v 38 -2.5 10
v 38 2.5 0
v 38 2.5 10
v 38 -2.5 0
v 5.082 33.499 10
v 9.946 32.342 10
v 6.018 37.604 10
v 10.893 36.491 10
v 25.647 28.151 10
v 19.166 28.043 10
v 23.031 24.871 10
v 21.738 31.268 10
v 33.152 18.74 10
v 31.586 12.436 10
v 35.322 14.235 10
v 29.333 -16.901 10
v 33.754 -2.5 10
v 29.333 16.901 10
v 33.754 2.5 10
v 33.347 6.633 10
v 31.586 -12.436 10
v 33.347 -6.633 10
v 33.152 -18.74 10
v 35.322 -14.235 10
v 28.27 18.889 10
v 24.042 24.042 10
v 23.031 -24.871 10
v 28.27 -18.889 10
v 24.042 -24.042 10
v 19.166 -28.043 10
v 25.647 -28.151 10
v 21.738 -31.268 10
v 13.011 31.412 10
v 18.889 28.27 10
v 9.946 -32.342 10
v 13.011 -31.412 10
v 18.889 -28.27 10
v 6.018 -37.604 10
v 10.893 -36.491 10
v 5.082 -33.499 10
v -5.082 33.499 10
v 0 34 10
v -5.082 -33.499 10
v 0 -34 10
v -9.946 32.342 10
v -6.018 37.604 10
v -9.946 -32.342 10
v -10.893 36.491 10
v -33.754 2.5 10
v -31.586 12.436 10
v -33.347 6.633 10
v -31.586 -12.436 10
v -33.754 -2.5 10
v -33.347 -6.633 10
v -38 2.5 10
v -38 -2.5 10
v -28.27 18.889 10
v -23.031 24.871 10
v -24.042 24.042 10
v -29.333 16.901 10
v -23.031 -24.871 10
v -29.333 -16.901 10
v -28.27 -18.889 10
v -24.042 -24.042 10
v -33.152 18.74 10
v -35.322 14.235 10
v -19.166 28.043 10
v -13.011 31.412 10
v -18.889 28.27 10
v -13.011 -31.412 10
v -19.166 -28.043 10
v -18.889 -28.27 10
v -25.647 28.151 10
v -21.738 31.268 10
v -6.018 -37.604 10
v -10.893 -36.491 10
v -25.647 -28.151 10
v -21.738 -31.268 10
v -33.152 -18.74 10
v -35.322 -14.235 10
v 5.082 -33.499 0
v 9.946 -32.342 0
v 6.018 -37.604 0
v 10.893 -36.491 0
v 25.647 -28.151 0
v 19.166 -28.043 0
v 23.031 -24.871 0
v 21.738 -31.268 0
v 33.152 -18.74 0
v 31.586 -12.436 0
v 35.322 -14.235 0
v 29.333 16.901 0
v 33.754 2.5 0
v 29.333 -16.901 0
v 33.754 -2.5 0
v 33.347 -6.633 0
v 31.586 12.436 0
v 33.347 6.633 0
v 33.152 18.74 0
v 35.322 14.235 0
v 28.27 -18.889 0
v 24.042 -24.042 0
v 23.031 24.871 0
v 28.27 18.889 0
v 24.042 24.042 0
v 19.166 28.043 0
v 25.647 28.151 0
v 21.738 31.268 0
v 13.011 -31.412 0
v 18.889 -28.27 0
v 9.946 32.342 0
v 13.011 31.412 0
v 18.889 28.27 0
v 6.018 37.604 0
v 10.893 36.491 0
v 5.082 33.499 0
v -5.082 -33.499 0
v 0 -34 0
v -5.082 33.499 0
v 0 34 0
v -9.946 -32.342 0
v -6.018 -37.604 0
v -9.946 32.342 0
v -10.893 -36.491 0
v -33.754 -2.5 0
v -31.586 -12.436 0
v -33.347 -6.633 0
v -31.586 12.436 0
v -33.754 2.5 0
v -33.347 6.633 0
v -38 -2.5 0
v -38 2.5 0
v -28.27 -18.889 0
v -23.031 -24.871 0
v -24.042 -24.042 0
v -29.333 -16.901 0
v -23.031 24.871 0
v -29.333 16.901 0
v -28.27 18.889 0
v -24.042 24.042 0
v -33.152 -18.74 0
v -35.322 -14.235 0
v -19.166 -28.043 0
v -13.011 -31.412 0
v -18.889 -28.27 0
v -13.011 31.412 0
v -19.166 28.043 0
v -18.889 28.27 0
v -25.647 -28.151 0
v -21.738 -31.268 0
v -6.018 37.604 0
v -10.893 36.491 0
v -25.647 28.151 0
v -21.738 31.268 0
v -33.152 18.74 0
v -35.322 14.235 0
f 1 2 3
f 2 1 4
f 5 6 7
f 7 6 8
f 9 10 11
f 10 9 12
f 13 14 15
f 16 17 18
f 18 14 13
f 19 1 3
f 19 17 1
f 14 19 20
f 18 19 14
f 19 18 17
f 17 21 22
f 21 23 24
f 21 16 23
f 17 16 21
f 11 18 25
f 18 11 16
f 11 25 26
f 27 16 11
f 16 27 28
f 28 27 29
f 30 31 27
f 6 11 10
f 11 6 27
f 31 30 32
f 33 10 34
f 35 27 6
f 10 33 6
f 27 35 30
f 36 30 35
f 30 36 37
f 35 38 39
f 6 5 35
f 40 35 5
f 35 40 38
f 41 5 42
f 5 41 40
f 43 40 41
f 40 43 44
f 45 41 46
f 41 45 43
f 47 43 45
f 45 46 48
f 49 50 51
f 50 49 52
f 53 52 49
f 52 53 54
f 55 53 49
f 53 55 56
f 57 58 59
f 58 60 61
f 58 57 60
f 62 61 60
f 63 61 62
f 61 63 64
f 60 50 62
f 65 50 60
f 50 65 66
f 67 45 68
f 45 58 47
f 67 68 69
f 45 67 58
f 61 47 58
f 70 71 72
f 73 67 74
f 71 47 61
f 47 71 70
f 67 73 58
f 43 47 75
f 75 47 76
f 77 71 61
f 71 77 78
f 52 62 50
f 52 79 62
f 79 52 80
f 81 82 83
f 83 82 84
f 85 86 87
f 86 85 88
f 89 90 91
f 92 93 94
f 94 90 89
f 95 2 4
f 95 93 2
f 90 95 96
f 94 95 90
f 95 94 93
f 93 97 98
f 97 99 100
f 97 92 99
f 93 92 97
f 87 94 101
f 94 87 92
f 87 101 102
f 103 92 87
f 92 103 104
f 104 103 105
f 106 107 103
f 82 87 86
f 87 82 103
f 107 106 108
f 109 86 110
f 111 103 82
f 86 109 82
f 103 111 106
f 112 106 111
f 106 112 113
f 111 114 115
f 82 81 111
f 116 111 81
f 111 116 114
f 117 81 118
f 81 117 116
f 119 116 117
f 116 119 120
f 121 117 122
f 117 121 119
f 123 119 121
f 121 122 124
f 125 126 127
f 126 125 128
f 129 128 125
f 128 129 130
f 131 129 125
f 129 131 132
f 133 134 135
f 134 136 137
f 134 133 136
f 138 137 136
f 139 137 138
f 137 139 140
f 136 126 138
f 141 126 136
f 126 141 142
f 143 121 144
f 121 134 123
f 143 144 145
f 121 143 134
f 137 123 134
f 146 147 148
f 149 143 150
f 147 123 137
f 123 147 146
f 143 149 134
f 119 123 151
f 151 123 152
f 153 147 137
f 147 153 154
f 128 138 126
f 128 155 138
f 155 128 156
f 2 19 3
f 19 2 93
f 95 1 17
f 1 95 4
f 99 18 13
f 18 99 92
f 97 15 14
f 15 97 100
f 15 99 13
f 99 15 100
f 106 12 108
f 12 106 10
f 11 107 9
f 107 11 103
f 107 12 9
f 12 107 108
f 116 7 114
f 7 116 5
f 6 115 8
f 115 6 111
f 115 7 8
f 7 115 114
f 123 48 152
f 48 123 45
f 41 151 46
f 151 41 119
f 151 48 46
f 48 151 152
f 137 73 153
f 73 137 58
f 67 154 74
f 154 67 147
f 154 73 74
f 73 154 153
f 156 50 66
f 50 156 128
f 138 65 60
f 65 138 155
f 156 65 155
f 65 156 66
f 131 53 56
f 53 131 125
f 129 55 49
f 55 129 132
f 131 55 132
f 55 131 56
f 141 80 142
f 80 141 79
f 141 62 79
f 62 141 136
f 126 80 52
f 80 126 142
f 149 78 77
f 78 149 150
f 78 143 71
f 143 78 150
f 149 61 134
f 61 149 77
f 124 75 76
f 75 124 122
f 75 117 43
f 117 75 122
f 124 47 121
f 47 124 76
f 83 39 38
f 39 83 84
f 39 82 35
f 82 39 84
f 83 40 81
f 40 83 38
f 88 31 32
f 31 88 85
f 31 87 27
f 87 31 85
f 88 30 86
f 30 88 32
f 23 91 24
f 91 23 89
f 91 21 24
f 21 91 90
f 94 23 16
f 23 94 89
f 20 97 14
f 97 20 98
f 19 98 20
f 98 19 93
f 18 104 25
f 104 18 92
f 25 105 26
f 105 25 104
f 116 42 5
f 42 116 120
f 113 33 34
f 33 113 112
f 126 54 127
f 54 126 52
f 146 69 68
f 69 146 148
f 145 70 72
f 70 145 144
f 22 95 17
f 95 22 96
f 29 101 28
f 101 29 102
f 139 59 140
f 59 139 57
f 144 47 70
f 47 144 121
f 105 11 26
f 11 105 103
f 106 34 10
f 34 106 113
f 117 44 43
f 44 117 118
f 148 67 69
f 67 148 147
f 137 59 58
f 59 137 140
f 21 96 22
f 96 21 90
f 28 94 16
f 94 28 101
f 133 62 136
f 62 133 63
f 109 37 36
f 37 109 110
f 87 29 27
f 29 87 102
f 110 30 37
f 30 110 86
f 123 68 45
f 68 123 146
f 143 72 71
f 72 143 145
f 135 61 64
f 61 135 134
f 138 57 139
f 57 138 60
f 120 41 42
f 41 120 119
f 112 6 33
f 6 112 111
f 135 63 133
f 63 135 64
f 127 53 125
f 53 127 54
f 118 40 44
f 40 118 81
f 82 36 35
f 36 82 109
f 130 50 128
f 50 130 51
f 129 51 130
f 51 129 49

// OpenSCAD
$fn = 32;

// ----------------------------------------------------------------------
// Spur blank: plain gear blank
// ----------------------------------------------------------------------

// --- parameters (mm) ---
disc_r = 34;              // blank root radius
disc_t = 10;              // blank thickness
n_teeth = 14;             // stub tooth count
tooth_w = 5;              // tooth width at the root
tooth_h = 4;              // tooth height above the root

out_r = disc_r + tooth_h;  // tip radius
bbox_x = 76.0;  // measured width over the teeth
bbox_y = 75.21;  // measured depth over the teeth

union() {
  cylinder(r = disc_r, h = disc_t);
  for (i = [0 : n_teeth - 1])
    rotate([0, 0, i * 360 / n_teeth])
      translate([disc_r - 1, -tooth_w / 2, 0])
        cube([tooth_h + 1, tooth_w, disc_t]);
}
